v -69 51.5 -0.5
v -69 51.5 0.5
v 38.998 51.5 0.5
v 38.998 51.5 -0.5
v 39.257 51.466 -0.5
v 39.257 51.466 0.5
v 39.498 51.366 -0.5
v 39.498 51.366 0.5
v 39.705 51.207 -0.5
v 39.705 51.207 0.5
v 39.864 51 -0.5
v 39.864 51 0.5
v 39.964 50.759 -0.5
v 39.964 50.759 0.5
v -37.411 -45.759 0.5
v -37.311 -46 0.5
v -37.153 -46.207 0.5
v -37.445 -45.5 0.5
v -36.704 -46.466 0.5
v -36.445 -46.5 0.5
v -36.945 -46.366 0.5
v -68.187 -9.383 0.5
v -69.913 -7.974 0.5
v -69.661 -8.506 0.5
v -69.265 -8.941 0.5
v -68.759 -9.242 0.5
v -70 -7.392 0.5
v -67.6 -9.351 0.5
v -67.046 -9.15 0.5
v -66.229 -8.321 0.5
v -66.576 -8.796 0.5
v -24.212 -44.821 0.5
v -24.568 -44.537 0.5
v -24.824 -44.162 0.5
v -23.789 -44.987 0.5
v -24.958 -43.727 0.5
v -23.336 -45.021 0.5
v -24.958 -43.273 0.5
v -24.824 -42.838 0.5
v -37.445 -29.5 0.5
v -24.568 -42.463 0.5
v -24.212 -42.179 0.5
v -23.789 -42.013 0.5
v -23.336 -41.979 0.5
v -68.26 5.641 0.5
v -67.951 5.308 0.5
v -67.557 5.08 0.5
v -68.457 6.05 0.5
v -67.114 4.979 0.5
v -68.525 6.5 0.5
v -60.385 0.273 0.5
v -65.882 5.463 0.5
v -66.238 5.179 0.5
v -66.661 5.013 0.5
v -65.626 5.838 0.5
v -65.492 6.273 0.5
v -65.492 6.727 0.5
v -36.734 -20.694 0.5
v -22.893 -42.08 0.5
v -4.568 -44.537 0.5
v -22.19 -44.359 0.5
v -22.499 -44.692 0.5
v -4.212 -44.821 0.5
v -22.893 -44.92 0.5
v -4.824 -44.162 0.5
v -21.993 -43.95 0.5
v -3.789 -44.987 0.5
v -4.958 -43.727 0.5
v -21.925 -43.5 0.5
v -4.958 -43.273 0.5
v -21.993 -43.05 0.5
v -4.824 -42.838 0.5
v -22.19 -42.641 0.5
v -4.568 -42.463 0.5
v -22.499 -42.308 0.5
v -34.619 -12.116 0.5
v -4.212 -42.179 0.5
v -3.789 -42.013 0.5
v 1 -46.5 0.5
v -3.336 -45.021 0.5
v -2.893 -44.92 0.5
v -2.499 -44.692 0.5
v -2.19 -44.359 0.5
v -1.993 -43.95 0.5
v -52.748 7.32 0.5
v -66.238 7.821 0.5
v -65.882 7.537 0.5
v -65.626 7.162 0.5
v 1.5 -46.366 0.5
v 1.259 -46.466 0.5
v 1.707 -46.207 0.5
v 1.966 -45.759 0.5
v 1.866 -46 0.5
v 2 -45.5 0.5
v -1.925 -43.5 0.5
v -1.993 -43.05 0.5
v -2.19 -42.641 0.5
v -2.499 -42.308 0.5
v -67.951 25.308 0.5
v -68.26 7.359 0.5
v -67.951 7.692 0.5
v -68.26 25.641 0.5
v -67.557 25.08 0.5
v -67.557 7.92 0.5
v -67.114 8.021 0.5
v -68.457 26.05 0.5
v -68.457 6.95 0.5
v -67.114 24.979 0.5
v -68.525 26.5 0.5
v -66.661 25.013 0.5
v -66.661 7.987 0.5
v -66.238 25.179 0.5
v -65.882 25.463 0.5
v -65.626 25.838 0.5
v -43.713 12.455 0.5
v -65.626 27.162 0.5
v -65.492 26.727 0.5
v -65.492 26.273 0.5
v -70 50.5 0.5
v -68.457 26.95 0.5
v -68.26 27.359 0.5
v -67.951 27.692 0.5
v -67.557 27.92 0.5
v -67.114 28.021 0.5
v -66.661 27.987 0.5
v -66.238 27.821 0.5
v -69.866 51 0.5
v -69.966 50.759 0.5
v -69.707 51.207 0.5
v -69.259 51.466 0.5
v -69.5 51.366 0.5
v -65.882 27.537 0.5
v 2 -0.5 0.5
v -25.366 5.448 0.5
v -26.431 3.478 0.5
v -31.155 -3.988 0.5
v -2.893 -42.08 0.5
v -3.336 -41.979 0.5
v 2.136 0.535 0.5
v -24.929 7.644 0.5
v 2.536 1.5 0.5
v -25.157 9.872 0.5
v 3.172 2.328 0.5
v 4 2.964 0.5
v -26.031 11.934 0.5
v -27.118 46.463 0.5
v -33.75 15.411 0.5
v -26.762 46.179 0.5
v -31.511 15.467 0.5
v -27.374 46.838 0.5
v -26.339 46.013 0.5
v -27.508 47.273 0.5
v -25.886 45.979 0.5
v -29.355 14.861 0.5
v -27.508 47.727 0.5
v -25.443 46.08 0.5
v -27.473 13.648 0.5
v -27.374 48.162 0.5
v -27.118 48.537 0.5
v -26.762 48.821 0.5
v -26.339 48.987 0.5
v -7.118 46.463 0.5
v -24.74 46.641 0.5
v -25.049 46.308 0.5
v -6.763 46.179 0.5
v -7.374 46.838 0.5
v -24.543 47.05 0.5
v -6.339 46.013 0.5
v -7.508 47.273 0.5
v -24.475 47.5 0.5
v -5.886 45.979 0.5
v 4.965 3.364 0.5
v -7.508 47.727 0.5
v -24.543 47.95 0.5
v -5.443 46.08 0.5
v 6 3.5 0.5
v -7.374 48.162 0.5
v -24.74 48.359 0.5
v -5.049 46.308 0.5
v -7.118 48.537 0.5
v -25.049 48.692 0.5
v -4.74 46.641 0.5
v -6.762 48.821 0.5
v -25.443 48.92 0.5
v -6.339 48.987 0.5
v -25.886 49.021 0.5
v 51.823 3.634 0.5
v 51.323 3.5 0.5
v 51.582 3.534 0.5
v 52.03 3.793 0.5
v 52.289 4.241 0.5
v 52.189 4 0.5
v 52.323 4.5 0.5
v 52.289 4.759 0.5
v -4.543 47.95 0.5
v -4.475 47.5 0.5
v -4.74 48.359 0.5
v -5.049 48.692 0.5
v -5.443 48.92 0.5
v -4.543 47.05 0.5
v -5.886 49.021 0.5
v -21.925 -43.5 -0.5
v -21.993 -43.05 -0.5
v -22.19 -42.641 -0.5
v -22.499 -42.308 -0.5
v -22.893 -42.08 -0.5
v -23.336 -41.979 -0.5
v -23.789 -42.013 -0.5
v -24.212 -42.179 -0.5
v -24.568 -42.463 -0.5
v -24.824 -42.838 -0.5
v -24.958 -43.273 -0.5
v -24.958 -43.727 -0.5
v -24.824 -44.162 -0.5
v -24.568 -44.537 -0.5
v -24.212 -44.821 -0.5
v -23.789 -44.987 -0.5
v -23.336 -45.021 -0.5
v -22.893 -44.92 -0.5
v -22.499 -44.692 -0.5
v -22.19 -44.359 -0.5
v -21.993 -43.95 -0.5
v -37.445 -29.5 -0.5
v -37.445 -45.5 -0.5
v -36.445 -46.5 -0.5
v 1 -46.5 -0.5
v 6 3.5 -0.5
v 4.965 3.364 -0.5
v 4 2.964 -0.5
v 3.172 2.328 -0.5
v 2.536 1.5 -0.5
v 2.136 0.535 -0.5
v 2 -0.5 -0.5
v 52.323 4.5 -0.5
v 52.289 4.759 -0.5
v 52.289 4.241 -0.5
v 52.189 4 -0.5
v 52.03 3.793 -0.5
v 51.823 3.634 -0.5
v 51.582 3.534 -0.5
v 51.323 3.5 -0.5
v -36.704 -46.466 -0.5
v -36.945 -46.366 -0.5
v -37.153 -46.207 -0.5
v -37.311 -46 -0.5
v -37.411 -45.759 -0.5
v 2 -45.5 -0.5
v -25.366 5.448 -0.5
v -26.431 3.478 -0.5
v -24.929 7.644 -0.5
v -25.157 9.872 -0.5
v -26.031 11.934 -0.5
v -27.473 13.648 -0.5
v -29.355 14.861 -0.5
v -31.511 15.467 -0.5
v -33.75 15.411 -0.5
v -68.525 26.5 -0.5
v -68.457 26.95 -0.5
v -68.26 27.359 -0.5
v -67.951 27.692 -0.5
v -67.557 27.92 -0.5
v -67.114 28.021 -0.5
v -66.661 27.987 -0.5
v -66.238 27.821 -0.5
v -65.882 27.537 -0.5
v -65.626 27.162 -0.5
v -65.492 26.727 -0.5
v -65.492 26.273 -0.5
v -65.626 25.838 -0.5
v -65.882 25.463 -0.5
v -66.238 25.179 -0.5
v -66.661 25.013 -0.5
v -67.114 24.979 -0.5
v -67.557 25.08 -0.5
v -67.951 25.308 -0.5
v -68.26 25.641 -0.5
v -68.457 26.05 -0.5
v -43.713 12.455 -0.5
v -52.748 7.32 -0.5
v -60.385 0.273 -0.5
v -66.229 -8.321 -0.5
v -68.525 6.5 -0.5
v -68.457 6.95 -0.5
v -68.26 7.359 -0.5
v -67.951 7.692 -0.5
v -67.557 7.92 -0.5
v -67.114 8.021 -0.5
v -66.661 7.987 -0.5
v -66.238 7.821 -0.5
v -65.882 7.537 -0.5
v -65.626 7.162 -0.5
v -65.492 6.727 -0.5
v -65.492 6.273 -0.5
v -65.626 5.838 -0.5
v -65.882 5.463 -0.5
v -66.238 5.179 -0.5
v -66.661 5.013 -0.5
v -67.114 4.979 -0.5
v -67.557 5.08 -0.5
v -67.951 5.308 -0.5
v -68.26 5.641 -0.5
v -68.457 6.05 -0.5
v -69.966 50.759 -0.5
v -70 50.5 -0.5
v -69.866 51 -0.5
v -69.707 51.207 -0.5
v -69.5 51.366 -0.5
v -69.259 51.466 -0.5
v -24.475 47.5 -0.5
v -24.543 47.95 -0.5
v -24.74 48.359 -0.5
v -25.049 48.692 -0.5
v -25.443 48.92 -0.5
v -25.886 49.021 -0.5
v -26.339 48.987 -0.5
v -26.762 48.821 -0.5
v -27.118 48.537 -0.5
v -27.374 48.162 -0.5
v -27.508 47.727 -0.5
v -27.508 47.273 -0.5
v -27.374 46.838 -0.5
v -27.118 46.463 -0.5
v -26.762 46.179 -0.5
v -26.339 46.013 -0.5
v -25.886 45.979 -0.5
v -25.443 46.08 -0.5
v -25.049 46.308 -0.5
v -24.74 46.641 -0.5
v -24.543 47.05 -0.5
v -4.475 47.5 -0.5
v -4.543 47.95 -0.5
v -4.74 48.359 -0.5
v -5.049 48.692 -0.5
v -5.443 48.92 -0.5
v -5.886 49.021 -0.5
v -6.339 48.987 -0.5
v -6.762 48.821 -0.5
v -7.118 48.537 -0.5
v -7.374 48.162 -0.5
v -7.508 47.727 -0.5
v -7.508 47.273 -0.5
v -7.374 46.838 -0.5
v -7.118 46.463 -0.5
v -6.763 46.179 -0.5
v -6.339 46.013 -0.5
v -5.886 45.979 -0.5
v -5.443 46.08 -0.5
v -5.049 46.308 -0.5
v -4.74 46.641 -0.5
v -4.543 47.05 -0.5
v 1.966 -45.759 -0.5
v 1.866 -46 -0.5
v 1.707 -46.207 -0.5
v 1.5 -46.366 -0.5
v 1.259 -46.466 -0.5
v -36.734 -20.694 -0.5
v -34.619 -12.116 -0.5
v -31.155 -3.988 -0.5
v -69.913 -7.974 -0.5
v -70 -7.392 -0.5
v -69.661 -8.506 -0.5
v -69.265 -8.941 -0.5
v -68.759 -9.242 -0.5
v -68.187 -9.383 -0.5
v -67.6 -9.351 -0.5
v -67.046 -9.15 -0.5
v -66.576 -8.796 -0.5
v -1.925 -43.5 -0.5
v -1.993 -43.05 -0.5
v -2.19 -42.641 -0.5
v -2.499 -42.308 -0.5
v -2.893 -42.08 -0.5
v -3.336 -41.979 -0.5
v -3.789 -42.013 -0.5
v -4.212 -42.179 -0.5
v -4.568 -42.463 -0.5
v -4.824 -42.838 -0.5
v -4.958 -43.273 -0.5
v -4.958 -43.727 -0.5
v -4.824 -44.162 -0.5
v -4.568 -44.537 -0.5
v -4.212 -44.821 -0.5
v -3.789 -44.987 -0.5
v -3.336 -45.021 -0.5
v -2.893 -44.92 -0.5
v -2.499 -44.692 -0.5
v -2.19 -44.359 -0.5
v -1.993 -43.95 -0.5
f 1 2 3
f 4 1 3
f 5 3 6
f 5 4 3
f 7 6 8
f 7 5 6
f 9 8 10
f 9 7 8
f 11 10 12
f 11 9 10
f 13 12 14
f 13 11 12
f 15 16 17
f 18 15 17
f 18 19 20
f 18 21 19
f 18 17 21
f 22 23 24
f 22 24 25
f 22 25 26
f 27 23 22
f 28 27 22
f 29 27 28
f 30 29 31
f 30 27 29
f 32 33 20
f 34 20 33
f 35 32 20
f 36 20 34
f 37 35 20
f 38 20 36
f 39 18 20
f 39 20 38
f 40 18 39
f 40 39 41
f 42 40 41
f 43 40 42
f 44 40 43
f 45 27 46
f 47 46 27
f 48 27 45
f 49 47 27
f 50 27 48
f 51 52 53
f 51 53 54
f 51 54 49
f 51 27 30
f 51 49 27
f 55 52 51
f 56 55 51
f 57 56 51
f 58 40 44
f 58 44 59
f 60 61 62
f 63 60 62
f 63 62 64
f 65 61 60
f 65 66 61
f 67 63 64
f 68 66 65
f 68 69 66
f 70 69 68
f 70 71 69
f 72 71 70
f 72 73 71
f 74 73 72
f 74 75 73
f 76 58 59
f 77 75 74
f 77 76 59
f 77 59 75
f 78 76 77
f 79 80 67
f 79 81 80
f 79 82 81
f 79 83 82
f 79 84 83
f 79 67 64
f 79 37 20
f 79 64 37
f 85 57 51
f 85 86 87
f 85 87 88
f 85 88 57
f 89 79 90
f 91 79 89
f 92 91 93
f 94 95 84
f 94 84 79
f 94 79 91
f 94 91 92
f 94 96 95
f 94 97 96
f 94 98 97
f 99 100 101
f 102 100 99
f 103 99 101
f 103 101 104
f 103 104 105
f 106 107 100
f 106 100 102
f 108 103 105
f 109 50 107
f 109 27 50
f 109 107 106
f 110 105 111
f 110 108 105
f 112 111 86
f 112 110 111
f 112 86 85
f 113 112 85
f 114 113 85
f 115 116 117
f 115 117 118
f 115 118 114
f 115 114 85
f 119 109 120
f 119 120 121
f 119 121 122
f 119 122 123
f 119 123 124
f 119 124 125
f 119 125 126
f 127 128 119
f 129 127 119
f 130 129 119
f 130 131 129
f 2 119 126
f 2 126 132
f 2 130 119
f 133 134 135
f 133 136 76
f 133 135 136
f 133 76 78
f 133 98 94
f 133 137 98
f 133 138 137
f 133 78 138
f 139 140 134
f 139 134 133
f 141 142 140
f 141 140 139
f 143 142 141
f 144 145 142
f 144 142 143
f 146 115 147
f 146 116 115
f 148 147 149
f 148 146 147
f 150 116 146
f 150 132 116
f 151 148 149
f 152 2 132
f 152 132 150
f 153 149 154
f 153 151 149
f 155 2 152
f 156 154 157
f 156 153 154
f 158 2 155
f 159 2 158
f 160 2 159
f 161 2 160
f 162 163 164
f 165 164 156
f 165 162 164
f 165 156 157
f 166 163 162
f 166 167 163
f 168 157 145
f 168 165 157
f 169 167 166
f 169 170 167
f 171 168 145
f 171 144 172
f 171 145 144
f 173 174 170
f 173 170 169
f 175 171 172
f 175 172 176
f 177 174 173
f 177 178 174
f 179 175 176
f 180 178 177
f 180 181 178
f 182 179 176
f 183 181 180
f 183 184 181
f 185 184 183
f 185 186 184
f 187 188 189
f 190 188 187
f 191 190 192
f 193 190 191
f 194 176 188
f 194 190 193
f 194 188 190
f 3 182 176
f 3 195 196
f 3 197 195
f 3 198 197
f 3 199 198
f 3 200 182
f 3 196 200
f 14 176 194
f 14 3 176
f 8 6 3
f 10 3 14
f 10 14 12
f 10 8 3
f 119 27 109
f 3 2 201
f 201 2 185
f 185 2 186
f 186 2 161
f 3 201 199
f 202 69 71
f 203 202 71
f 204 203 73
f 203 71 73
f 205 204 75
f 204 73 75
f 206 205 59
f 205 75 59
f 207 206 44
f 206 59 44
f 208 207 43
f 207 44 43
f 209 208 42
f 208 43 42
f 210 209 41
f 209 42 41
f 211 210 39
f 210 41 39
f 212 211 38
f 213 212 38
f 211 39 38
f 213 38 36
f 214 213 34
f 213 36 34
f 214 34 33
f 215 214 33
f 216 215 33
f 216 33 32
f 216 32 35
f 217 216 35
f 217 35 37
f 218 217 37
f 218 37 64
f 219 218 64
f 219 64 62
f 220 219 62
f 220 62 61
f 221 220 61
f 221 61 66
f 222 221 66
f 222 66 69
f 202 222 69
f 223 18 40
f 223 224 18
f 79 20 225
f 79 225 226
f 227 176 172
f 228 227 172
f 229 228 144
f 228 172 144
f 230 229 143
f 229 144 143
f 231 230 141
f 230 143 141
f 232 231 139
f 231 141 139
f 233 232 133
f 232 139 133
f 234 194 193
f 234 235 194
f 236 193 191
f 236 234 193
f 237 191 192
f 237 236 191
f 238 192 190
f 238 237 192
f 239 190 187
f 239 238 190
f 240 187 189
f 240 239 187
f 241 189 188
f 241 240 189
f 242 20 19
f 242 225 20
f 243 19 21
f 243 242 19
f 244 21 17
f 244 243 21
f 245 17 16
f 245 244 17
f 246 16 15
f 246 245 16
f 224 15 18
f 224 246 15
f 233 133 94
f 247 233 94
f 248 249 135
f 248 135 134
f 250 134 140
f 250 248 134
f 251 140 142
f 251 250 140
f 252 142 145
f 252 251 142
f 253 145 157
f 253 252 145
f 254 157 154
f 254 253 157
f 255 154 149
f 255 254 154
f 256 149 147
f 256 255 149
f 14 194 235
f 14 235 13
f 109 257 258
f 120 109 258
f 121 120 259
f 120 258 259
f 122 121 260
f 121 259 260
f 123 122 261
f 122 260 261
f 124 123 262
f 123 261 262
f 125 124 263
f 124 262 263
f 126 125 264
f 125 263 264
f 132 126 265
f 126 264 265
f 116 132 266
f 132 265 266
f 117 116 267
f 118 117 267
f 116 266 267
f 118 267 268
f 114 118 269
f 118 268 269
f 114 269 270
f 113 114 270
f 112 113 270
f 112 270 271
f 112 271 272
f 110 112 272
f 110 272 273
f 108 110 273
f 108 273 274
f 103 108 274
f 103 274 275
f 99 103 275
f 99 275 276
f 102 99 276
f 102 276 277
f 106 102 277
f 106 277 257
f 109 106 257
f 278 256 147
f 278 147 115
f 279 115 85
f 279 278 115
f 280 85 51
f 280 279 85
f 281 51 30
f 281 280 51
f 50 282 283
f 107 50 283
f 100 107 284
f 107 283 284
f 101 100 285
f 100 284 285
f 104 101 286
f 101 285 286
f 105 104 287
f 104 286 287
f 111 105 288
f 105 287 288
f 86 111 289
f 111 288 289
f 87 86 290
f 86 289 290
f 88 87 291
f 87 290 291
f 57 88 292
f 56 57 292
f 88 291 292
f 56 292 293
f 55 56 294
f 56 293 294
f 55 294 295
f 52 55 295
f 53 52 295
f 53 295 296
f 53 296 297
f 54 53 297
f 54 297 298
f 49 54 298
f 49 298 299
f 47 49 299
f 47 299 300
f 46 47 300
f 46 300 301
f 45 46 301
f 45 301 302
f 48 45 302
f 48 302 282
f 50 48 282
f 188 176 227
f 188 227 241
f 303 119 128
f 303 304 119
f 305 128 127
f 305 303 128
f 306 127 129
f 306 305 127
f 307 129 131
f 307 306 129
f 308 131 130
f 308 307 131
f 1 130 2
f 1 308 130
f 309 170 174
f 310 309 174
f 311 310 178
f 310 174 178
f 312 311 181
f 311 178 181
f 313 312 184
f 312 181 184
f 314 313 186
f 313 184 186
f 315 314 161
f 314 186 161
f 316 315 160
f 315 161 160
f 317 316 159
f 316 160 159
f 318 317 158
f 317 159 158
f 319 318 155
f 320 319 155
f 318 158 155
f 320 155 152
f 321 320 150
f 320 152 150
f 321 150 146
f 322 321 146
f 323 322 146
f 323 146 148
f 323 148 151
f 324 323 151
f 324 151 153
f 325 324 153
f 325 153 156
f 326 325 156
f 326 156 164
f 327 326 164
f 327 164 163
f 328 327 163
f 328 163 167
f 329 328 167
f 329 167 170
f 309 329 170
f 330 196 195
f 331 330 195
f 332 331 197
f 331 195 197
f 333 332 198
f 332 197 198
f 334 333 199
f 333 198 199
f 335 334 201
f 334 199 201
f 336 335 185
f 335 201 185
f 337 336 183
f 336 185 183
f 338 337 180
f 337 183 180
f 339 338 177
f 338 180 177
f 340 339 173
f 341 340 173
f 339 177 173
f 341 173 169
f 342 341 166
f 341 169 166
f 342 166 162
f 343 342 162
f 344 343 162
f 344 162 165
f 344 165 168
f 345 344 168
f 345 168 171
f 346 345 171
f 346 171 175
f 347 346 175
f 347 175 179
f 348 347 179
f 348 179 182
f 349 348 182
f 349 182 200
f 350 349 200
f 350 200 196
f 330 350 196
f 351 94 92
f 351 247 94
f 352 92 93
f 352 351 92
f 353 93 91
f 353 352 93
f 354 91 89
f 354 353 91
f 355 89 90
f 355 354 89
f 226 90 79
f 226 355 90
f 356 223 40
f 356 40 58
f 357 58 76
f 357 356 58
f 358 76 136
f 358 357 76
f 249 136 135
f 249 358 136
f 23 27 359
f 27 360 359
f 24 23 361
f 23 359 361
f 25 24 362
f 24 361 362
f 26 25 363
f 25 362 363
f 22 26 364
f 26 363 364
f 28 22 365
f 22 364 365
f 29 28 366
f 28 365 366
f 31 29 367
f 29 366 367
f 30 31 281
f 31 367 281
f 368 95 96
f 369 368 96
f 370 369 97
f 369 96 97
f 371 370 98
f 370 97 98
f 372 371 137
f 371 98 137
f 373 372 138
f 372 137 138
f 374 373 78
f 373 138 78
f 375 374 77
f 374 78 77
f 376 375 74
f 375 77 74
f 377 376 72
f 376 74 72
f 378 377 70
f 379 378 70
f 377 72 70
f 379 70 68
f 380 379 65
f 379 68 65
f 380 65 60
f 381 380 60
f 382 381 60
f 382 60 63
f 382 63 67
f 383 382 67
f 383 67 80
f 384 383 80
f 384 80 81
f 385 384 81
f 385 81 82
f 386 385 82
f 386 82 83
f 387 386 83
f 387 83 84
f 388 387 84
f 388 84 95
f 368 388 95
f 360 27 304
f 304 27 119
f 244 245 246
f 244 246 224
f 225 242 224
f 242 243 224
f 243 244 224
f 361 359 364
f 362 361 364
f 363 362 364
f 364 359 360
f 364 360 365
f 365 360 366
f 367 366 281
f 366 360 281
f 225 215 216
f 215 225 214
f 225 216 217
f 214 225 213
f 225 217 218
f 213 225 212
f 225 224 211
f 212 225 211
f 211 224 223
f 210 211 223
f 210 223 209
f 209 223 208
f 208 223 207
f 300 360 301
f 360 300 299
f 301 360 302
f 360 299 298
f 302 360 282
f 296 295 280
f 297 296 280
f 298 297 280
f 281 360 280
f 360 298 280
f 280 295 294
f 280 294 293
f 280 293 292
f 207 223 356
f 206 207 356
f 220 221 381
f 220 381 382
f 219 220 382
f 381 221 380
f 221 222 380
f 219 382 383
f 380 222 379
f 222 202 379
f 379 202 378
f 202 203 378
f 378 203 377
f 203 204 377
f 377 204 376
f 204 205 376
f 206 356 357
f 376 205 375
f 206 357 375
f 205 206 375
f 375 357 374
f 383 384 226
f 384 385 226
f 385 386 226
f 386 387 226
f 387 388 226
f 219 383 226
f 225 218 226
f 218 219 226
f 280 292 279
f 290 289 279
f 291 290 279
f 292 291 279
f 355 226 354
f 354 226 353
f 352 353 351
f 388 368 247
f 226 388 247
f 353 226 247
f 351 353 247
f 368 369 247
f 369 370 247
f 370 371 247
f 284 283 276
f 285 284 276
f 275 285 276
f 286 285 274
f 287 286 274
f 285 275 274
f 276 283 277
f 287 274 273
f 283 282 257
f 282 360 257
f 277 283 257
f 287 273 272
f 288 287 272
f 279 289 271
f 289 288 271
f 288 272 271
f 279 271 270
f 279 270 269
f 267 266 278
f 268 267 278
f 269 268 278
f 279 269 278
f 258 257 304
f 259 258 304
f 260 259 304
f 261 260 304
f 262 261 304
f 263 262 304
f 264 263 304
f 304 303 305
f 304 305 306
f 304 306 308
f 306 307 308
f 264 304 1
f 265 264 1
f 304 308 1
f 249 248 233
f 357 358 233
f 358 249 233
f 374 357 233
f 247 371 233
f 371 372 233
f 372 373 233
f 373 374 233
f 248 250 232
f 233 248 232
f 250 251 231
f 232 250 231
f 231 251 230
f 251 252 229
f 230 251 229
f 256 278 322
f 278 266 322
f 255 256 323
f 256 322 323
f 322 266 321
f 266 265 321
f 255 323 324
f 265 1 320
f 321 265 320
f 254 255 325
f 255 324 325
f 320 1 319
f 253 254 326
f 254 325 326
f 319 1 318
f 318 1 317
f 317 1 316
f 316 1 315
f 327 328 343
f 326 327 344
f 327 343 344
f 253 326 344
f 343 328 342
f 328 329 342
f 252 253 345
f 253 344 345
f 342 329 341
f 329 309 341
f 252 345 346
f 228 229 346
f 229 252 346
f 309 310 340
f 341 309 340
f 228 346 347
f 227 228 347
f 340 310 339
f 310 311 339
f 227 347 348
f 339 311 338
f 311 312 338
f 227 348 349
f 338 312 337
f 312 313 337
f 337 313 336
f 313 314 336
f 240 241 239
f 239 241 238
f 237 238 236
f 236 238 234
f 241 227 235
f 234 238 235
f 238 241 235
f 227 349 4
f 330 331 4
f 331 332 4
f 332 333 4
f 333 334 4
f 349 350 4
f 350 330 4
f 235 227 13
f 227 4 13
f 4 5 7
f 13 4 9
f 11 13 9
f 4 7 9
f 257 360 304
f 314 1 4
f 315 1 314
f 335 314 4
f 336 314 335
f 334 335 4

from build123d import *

# Parameters (mm, degrees)
SKETCH_1_W          = 140
SKETCH_1_H          = 103
EXTRUDE_1_DEPTH     = 0.5
CUT_EXTRUDE_1_DEPTH = 1.5
CUT_EXTRUDE_2_DEPTH = 1.5
SKETCH_4_W          = 33.363809018
SKETCH_4_H          = 55
CUT_EXTRUDE_3_DEPTH = 1
FILLET_1_R          = 2
SKETCH_6_R          = 1.525
CUT_EXTRUDE_5_DEPTH = 10
SKETCH_7_R          = 1.525
CUT_EXTRUDE_6_DEPTH = 10
SKETCH_8_R          = 1.525
SKETCH_8_W          = 39.445445888
SKETCH_8_H          = 5
CUT_EXTRUDE_7_DEPTH = 10
FILLET_2_R          = 1


with BuildPart() as part:
    # 草图1 → 凸台-拉伸1 (new, symmetric)
    with BuildSketch(Plane.XY):
        Rectangle(SKETCH_1_W, SKETCH_1_H)
    extrude(amount=EXTRUDE_1_DEPTH, both=True)

    # 草图2 → 切除-拉伸1 (cut, symmetric)
    with BuildSketch(Plane.XY.offset(0.5)):
        with BuildLine():
            Line((-71.445445888, -29.5), (-71.445445888, -77.5))
            ThreePointArc((-71.445445888, -77.5), (-69.980979794, -81.035533906), (-66.445445888, -82.5))
            Line((-66.445445888, -82.5), (-42.445445888, -82.5))
            ThreePointArc((-42.445445888, -82.5), (-38.909911982, -81.035533906), (-37.445445888, -77.5))
            Line((-37.445445888, -77.5), (-37.445445888, -29.5))
            ThreePointArc((-37.445445888, -29.5), (-34.619011221, -12.115704179), (-26.430867135, 3.477780697))
            ThreePointArc((-26.430867135, 3.477780697), (-26.030895398, 11.934357254), (-33.750115979, 15.411036429))
            ThreePointArc((-33.750115979, 15.411036429), (-60.772664783, -0.183029274), (-71.445445888, -29.5))
        make_face()
        with BuildLine():
            Line((6, -82.5), (34, -82.5))
            ThreePointArc((34, -82.5), (36.828427125, -81.328427125), (38, -78.5))
            Line((38, -78.5), (38, -0.5))
            ThreePointArc((38, -0.5), (36.828427125, 2.328427125), (34, 3.5))
            Line((34, 3.5), (6, 3.5))
            ThreePointArc((6, 3.5), (3.171572875, 2.328427125), (2, -0.5))
            Line((2, -0.5), (2, -78.5))
            ThreePointArc((2, -78.5), (3.171572875, -81.328427125), (6, -82.5))
        make_face()
    extrude(amount=CUT_EXTRUDE_1_DEPTH, both=True, mode=Mode.SUBTRACT)

    # 草图3 → 切除-拉伸2 (cut, symmetric)
    with BuildSketch(Plane.XY.offset(0.5)):
        Polygon((67.363809018, -51.5), (39.765042197, 51.5), (70, 51.5), (70, -51.5), align=None)
    extrude(amount=CUT_EXTRUDE_2_DEPTH, both=True, mode=Mode.SUBTRACT)

    # 草图4 → 切除-拉伸3 (cut, symmetric)
    with BuildSketch(Plane.XY.offset(0.5)):
        with Locations((50.681904509, -24)):
            Rectangle(SKETCH_4_W, SKETCH_4_H)
    extrude(amount=CUT_EXTRUDE_3_DEPTH, both=True, mode=Mode.SUBTRACT)

    # 圆角1
    fillet_1_edges = [part.edges().sort_by_distance(p)[0] for p in [
        (-70, -18.109646868, 0),
    ]]
    fillet(fillet_1_edges, radius=FILLET_1_R)

    # 草图6 → 切除-拉伸5 (cut)
    with BuildSketch(Plane.XY.offset(0.5)):
        with Locations((-26, 47.5)):
            Circle(SKETCH_6_R)
        with Locations((-6, 47.5)):
            Circle(SKETCH_6_R)
    extrude(amount=-CUT_EXTRUDE_5_DEPTH, mode=Mode.SUBTRACT)

    # 草图7 → 切除-拉伸6 (cut)
    with BuildSketch(Plane(origin=(0, 0, -0.5), x_dir=(-1, 0, 0), z_dir=(0, 0, -1))):
        with Locations((67, 6.5)):
            Circle(SKETCH_7_R)
        with Locations((67, 26.5)):
            Circle(SKETCH_7_R)
    extrude(amount=-CUT_EXTRUDE_6_DEPTH, mode=Mode.SUBTRACT)

    # 草图8 → 切除-拉伸7 (cut)
    with BuildSketch(Plane.XY.offset(0.5)):
        with Locations((-23.45, -43.5)):
            Circle(SKETCH_8_R)
        with Locations((-3.45, -43.5)):
            Circle(SKETCH_8_R)
        with Locations((-17.722722944, -49)):
            Rectangle(SKETCH_8_W, SKETCH_8_H)
    extrude(amount=-CUT_EXTRUDE_7_DEPTH, mode=Mode.SUBTRACT)

    # 圆角2
    fillet_2_edges = [part.edges().sort_by_distance(p)[0] for p in [
        (52.626603434, 3.5, 0),
        (-37.445445888, -46.5, 0),
        (2, -46.5, 0),
        (-70, 51.5, 0),
        (39.765042197, 51.5, 0),
    ]]
    fillet(fillet_2_edges, radius=FILLET_2_R)


solid = part.part
